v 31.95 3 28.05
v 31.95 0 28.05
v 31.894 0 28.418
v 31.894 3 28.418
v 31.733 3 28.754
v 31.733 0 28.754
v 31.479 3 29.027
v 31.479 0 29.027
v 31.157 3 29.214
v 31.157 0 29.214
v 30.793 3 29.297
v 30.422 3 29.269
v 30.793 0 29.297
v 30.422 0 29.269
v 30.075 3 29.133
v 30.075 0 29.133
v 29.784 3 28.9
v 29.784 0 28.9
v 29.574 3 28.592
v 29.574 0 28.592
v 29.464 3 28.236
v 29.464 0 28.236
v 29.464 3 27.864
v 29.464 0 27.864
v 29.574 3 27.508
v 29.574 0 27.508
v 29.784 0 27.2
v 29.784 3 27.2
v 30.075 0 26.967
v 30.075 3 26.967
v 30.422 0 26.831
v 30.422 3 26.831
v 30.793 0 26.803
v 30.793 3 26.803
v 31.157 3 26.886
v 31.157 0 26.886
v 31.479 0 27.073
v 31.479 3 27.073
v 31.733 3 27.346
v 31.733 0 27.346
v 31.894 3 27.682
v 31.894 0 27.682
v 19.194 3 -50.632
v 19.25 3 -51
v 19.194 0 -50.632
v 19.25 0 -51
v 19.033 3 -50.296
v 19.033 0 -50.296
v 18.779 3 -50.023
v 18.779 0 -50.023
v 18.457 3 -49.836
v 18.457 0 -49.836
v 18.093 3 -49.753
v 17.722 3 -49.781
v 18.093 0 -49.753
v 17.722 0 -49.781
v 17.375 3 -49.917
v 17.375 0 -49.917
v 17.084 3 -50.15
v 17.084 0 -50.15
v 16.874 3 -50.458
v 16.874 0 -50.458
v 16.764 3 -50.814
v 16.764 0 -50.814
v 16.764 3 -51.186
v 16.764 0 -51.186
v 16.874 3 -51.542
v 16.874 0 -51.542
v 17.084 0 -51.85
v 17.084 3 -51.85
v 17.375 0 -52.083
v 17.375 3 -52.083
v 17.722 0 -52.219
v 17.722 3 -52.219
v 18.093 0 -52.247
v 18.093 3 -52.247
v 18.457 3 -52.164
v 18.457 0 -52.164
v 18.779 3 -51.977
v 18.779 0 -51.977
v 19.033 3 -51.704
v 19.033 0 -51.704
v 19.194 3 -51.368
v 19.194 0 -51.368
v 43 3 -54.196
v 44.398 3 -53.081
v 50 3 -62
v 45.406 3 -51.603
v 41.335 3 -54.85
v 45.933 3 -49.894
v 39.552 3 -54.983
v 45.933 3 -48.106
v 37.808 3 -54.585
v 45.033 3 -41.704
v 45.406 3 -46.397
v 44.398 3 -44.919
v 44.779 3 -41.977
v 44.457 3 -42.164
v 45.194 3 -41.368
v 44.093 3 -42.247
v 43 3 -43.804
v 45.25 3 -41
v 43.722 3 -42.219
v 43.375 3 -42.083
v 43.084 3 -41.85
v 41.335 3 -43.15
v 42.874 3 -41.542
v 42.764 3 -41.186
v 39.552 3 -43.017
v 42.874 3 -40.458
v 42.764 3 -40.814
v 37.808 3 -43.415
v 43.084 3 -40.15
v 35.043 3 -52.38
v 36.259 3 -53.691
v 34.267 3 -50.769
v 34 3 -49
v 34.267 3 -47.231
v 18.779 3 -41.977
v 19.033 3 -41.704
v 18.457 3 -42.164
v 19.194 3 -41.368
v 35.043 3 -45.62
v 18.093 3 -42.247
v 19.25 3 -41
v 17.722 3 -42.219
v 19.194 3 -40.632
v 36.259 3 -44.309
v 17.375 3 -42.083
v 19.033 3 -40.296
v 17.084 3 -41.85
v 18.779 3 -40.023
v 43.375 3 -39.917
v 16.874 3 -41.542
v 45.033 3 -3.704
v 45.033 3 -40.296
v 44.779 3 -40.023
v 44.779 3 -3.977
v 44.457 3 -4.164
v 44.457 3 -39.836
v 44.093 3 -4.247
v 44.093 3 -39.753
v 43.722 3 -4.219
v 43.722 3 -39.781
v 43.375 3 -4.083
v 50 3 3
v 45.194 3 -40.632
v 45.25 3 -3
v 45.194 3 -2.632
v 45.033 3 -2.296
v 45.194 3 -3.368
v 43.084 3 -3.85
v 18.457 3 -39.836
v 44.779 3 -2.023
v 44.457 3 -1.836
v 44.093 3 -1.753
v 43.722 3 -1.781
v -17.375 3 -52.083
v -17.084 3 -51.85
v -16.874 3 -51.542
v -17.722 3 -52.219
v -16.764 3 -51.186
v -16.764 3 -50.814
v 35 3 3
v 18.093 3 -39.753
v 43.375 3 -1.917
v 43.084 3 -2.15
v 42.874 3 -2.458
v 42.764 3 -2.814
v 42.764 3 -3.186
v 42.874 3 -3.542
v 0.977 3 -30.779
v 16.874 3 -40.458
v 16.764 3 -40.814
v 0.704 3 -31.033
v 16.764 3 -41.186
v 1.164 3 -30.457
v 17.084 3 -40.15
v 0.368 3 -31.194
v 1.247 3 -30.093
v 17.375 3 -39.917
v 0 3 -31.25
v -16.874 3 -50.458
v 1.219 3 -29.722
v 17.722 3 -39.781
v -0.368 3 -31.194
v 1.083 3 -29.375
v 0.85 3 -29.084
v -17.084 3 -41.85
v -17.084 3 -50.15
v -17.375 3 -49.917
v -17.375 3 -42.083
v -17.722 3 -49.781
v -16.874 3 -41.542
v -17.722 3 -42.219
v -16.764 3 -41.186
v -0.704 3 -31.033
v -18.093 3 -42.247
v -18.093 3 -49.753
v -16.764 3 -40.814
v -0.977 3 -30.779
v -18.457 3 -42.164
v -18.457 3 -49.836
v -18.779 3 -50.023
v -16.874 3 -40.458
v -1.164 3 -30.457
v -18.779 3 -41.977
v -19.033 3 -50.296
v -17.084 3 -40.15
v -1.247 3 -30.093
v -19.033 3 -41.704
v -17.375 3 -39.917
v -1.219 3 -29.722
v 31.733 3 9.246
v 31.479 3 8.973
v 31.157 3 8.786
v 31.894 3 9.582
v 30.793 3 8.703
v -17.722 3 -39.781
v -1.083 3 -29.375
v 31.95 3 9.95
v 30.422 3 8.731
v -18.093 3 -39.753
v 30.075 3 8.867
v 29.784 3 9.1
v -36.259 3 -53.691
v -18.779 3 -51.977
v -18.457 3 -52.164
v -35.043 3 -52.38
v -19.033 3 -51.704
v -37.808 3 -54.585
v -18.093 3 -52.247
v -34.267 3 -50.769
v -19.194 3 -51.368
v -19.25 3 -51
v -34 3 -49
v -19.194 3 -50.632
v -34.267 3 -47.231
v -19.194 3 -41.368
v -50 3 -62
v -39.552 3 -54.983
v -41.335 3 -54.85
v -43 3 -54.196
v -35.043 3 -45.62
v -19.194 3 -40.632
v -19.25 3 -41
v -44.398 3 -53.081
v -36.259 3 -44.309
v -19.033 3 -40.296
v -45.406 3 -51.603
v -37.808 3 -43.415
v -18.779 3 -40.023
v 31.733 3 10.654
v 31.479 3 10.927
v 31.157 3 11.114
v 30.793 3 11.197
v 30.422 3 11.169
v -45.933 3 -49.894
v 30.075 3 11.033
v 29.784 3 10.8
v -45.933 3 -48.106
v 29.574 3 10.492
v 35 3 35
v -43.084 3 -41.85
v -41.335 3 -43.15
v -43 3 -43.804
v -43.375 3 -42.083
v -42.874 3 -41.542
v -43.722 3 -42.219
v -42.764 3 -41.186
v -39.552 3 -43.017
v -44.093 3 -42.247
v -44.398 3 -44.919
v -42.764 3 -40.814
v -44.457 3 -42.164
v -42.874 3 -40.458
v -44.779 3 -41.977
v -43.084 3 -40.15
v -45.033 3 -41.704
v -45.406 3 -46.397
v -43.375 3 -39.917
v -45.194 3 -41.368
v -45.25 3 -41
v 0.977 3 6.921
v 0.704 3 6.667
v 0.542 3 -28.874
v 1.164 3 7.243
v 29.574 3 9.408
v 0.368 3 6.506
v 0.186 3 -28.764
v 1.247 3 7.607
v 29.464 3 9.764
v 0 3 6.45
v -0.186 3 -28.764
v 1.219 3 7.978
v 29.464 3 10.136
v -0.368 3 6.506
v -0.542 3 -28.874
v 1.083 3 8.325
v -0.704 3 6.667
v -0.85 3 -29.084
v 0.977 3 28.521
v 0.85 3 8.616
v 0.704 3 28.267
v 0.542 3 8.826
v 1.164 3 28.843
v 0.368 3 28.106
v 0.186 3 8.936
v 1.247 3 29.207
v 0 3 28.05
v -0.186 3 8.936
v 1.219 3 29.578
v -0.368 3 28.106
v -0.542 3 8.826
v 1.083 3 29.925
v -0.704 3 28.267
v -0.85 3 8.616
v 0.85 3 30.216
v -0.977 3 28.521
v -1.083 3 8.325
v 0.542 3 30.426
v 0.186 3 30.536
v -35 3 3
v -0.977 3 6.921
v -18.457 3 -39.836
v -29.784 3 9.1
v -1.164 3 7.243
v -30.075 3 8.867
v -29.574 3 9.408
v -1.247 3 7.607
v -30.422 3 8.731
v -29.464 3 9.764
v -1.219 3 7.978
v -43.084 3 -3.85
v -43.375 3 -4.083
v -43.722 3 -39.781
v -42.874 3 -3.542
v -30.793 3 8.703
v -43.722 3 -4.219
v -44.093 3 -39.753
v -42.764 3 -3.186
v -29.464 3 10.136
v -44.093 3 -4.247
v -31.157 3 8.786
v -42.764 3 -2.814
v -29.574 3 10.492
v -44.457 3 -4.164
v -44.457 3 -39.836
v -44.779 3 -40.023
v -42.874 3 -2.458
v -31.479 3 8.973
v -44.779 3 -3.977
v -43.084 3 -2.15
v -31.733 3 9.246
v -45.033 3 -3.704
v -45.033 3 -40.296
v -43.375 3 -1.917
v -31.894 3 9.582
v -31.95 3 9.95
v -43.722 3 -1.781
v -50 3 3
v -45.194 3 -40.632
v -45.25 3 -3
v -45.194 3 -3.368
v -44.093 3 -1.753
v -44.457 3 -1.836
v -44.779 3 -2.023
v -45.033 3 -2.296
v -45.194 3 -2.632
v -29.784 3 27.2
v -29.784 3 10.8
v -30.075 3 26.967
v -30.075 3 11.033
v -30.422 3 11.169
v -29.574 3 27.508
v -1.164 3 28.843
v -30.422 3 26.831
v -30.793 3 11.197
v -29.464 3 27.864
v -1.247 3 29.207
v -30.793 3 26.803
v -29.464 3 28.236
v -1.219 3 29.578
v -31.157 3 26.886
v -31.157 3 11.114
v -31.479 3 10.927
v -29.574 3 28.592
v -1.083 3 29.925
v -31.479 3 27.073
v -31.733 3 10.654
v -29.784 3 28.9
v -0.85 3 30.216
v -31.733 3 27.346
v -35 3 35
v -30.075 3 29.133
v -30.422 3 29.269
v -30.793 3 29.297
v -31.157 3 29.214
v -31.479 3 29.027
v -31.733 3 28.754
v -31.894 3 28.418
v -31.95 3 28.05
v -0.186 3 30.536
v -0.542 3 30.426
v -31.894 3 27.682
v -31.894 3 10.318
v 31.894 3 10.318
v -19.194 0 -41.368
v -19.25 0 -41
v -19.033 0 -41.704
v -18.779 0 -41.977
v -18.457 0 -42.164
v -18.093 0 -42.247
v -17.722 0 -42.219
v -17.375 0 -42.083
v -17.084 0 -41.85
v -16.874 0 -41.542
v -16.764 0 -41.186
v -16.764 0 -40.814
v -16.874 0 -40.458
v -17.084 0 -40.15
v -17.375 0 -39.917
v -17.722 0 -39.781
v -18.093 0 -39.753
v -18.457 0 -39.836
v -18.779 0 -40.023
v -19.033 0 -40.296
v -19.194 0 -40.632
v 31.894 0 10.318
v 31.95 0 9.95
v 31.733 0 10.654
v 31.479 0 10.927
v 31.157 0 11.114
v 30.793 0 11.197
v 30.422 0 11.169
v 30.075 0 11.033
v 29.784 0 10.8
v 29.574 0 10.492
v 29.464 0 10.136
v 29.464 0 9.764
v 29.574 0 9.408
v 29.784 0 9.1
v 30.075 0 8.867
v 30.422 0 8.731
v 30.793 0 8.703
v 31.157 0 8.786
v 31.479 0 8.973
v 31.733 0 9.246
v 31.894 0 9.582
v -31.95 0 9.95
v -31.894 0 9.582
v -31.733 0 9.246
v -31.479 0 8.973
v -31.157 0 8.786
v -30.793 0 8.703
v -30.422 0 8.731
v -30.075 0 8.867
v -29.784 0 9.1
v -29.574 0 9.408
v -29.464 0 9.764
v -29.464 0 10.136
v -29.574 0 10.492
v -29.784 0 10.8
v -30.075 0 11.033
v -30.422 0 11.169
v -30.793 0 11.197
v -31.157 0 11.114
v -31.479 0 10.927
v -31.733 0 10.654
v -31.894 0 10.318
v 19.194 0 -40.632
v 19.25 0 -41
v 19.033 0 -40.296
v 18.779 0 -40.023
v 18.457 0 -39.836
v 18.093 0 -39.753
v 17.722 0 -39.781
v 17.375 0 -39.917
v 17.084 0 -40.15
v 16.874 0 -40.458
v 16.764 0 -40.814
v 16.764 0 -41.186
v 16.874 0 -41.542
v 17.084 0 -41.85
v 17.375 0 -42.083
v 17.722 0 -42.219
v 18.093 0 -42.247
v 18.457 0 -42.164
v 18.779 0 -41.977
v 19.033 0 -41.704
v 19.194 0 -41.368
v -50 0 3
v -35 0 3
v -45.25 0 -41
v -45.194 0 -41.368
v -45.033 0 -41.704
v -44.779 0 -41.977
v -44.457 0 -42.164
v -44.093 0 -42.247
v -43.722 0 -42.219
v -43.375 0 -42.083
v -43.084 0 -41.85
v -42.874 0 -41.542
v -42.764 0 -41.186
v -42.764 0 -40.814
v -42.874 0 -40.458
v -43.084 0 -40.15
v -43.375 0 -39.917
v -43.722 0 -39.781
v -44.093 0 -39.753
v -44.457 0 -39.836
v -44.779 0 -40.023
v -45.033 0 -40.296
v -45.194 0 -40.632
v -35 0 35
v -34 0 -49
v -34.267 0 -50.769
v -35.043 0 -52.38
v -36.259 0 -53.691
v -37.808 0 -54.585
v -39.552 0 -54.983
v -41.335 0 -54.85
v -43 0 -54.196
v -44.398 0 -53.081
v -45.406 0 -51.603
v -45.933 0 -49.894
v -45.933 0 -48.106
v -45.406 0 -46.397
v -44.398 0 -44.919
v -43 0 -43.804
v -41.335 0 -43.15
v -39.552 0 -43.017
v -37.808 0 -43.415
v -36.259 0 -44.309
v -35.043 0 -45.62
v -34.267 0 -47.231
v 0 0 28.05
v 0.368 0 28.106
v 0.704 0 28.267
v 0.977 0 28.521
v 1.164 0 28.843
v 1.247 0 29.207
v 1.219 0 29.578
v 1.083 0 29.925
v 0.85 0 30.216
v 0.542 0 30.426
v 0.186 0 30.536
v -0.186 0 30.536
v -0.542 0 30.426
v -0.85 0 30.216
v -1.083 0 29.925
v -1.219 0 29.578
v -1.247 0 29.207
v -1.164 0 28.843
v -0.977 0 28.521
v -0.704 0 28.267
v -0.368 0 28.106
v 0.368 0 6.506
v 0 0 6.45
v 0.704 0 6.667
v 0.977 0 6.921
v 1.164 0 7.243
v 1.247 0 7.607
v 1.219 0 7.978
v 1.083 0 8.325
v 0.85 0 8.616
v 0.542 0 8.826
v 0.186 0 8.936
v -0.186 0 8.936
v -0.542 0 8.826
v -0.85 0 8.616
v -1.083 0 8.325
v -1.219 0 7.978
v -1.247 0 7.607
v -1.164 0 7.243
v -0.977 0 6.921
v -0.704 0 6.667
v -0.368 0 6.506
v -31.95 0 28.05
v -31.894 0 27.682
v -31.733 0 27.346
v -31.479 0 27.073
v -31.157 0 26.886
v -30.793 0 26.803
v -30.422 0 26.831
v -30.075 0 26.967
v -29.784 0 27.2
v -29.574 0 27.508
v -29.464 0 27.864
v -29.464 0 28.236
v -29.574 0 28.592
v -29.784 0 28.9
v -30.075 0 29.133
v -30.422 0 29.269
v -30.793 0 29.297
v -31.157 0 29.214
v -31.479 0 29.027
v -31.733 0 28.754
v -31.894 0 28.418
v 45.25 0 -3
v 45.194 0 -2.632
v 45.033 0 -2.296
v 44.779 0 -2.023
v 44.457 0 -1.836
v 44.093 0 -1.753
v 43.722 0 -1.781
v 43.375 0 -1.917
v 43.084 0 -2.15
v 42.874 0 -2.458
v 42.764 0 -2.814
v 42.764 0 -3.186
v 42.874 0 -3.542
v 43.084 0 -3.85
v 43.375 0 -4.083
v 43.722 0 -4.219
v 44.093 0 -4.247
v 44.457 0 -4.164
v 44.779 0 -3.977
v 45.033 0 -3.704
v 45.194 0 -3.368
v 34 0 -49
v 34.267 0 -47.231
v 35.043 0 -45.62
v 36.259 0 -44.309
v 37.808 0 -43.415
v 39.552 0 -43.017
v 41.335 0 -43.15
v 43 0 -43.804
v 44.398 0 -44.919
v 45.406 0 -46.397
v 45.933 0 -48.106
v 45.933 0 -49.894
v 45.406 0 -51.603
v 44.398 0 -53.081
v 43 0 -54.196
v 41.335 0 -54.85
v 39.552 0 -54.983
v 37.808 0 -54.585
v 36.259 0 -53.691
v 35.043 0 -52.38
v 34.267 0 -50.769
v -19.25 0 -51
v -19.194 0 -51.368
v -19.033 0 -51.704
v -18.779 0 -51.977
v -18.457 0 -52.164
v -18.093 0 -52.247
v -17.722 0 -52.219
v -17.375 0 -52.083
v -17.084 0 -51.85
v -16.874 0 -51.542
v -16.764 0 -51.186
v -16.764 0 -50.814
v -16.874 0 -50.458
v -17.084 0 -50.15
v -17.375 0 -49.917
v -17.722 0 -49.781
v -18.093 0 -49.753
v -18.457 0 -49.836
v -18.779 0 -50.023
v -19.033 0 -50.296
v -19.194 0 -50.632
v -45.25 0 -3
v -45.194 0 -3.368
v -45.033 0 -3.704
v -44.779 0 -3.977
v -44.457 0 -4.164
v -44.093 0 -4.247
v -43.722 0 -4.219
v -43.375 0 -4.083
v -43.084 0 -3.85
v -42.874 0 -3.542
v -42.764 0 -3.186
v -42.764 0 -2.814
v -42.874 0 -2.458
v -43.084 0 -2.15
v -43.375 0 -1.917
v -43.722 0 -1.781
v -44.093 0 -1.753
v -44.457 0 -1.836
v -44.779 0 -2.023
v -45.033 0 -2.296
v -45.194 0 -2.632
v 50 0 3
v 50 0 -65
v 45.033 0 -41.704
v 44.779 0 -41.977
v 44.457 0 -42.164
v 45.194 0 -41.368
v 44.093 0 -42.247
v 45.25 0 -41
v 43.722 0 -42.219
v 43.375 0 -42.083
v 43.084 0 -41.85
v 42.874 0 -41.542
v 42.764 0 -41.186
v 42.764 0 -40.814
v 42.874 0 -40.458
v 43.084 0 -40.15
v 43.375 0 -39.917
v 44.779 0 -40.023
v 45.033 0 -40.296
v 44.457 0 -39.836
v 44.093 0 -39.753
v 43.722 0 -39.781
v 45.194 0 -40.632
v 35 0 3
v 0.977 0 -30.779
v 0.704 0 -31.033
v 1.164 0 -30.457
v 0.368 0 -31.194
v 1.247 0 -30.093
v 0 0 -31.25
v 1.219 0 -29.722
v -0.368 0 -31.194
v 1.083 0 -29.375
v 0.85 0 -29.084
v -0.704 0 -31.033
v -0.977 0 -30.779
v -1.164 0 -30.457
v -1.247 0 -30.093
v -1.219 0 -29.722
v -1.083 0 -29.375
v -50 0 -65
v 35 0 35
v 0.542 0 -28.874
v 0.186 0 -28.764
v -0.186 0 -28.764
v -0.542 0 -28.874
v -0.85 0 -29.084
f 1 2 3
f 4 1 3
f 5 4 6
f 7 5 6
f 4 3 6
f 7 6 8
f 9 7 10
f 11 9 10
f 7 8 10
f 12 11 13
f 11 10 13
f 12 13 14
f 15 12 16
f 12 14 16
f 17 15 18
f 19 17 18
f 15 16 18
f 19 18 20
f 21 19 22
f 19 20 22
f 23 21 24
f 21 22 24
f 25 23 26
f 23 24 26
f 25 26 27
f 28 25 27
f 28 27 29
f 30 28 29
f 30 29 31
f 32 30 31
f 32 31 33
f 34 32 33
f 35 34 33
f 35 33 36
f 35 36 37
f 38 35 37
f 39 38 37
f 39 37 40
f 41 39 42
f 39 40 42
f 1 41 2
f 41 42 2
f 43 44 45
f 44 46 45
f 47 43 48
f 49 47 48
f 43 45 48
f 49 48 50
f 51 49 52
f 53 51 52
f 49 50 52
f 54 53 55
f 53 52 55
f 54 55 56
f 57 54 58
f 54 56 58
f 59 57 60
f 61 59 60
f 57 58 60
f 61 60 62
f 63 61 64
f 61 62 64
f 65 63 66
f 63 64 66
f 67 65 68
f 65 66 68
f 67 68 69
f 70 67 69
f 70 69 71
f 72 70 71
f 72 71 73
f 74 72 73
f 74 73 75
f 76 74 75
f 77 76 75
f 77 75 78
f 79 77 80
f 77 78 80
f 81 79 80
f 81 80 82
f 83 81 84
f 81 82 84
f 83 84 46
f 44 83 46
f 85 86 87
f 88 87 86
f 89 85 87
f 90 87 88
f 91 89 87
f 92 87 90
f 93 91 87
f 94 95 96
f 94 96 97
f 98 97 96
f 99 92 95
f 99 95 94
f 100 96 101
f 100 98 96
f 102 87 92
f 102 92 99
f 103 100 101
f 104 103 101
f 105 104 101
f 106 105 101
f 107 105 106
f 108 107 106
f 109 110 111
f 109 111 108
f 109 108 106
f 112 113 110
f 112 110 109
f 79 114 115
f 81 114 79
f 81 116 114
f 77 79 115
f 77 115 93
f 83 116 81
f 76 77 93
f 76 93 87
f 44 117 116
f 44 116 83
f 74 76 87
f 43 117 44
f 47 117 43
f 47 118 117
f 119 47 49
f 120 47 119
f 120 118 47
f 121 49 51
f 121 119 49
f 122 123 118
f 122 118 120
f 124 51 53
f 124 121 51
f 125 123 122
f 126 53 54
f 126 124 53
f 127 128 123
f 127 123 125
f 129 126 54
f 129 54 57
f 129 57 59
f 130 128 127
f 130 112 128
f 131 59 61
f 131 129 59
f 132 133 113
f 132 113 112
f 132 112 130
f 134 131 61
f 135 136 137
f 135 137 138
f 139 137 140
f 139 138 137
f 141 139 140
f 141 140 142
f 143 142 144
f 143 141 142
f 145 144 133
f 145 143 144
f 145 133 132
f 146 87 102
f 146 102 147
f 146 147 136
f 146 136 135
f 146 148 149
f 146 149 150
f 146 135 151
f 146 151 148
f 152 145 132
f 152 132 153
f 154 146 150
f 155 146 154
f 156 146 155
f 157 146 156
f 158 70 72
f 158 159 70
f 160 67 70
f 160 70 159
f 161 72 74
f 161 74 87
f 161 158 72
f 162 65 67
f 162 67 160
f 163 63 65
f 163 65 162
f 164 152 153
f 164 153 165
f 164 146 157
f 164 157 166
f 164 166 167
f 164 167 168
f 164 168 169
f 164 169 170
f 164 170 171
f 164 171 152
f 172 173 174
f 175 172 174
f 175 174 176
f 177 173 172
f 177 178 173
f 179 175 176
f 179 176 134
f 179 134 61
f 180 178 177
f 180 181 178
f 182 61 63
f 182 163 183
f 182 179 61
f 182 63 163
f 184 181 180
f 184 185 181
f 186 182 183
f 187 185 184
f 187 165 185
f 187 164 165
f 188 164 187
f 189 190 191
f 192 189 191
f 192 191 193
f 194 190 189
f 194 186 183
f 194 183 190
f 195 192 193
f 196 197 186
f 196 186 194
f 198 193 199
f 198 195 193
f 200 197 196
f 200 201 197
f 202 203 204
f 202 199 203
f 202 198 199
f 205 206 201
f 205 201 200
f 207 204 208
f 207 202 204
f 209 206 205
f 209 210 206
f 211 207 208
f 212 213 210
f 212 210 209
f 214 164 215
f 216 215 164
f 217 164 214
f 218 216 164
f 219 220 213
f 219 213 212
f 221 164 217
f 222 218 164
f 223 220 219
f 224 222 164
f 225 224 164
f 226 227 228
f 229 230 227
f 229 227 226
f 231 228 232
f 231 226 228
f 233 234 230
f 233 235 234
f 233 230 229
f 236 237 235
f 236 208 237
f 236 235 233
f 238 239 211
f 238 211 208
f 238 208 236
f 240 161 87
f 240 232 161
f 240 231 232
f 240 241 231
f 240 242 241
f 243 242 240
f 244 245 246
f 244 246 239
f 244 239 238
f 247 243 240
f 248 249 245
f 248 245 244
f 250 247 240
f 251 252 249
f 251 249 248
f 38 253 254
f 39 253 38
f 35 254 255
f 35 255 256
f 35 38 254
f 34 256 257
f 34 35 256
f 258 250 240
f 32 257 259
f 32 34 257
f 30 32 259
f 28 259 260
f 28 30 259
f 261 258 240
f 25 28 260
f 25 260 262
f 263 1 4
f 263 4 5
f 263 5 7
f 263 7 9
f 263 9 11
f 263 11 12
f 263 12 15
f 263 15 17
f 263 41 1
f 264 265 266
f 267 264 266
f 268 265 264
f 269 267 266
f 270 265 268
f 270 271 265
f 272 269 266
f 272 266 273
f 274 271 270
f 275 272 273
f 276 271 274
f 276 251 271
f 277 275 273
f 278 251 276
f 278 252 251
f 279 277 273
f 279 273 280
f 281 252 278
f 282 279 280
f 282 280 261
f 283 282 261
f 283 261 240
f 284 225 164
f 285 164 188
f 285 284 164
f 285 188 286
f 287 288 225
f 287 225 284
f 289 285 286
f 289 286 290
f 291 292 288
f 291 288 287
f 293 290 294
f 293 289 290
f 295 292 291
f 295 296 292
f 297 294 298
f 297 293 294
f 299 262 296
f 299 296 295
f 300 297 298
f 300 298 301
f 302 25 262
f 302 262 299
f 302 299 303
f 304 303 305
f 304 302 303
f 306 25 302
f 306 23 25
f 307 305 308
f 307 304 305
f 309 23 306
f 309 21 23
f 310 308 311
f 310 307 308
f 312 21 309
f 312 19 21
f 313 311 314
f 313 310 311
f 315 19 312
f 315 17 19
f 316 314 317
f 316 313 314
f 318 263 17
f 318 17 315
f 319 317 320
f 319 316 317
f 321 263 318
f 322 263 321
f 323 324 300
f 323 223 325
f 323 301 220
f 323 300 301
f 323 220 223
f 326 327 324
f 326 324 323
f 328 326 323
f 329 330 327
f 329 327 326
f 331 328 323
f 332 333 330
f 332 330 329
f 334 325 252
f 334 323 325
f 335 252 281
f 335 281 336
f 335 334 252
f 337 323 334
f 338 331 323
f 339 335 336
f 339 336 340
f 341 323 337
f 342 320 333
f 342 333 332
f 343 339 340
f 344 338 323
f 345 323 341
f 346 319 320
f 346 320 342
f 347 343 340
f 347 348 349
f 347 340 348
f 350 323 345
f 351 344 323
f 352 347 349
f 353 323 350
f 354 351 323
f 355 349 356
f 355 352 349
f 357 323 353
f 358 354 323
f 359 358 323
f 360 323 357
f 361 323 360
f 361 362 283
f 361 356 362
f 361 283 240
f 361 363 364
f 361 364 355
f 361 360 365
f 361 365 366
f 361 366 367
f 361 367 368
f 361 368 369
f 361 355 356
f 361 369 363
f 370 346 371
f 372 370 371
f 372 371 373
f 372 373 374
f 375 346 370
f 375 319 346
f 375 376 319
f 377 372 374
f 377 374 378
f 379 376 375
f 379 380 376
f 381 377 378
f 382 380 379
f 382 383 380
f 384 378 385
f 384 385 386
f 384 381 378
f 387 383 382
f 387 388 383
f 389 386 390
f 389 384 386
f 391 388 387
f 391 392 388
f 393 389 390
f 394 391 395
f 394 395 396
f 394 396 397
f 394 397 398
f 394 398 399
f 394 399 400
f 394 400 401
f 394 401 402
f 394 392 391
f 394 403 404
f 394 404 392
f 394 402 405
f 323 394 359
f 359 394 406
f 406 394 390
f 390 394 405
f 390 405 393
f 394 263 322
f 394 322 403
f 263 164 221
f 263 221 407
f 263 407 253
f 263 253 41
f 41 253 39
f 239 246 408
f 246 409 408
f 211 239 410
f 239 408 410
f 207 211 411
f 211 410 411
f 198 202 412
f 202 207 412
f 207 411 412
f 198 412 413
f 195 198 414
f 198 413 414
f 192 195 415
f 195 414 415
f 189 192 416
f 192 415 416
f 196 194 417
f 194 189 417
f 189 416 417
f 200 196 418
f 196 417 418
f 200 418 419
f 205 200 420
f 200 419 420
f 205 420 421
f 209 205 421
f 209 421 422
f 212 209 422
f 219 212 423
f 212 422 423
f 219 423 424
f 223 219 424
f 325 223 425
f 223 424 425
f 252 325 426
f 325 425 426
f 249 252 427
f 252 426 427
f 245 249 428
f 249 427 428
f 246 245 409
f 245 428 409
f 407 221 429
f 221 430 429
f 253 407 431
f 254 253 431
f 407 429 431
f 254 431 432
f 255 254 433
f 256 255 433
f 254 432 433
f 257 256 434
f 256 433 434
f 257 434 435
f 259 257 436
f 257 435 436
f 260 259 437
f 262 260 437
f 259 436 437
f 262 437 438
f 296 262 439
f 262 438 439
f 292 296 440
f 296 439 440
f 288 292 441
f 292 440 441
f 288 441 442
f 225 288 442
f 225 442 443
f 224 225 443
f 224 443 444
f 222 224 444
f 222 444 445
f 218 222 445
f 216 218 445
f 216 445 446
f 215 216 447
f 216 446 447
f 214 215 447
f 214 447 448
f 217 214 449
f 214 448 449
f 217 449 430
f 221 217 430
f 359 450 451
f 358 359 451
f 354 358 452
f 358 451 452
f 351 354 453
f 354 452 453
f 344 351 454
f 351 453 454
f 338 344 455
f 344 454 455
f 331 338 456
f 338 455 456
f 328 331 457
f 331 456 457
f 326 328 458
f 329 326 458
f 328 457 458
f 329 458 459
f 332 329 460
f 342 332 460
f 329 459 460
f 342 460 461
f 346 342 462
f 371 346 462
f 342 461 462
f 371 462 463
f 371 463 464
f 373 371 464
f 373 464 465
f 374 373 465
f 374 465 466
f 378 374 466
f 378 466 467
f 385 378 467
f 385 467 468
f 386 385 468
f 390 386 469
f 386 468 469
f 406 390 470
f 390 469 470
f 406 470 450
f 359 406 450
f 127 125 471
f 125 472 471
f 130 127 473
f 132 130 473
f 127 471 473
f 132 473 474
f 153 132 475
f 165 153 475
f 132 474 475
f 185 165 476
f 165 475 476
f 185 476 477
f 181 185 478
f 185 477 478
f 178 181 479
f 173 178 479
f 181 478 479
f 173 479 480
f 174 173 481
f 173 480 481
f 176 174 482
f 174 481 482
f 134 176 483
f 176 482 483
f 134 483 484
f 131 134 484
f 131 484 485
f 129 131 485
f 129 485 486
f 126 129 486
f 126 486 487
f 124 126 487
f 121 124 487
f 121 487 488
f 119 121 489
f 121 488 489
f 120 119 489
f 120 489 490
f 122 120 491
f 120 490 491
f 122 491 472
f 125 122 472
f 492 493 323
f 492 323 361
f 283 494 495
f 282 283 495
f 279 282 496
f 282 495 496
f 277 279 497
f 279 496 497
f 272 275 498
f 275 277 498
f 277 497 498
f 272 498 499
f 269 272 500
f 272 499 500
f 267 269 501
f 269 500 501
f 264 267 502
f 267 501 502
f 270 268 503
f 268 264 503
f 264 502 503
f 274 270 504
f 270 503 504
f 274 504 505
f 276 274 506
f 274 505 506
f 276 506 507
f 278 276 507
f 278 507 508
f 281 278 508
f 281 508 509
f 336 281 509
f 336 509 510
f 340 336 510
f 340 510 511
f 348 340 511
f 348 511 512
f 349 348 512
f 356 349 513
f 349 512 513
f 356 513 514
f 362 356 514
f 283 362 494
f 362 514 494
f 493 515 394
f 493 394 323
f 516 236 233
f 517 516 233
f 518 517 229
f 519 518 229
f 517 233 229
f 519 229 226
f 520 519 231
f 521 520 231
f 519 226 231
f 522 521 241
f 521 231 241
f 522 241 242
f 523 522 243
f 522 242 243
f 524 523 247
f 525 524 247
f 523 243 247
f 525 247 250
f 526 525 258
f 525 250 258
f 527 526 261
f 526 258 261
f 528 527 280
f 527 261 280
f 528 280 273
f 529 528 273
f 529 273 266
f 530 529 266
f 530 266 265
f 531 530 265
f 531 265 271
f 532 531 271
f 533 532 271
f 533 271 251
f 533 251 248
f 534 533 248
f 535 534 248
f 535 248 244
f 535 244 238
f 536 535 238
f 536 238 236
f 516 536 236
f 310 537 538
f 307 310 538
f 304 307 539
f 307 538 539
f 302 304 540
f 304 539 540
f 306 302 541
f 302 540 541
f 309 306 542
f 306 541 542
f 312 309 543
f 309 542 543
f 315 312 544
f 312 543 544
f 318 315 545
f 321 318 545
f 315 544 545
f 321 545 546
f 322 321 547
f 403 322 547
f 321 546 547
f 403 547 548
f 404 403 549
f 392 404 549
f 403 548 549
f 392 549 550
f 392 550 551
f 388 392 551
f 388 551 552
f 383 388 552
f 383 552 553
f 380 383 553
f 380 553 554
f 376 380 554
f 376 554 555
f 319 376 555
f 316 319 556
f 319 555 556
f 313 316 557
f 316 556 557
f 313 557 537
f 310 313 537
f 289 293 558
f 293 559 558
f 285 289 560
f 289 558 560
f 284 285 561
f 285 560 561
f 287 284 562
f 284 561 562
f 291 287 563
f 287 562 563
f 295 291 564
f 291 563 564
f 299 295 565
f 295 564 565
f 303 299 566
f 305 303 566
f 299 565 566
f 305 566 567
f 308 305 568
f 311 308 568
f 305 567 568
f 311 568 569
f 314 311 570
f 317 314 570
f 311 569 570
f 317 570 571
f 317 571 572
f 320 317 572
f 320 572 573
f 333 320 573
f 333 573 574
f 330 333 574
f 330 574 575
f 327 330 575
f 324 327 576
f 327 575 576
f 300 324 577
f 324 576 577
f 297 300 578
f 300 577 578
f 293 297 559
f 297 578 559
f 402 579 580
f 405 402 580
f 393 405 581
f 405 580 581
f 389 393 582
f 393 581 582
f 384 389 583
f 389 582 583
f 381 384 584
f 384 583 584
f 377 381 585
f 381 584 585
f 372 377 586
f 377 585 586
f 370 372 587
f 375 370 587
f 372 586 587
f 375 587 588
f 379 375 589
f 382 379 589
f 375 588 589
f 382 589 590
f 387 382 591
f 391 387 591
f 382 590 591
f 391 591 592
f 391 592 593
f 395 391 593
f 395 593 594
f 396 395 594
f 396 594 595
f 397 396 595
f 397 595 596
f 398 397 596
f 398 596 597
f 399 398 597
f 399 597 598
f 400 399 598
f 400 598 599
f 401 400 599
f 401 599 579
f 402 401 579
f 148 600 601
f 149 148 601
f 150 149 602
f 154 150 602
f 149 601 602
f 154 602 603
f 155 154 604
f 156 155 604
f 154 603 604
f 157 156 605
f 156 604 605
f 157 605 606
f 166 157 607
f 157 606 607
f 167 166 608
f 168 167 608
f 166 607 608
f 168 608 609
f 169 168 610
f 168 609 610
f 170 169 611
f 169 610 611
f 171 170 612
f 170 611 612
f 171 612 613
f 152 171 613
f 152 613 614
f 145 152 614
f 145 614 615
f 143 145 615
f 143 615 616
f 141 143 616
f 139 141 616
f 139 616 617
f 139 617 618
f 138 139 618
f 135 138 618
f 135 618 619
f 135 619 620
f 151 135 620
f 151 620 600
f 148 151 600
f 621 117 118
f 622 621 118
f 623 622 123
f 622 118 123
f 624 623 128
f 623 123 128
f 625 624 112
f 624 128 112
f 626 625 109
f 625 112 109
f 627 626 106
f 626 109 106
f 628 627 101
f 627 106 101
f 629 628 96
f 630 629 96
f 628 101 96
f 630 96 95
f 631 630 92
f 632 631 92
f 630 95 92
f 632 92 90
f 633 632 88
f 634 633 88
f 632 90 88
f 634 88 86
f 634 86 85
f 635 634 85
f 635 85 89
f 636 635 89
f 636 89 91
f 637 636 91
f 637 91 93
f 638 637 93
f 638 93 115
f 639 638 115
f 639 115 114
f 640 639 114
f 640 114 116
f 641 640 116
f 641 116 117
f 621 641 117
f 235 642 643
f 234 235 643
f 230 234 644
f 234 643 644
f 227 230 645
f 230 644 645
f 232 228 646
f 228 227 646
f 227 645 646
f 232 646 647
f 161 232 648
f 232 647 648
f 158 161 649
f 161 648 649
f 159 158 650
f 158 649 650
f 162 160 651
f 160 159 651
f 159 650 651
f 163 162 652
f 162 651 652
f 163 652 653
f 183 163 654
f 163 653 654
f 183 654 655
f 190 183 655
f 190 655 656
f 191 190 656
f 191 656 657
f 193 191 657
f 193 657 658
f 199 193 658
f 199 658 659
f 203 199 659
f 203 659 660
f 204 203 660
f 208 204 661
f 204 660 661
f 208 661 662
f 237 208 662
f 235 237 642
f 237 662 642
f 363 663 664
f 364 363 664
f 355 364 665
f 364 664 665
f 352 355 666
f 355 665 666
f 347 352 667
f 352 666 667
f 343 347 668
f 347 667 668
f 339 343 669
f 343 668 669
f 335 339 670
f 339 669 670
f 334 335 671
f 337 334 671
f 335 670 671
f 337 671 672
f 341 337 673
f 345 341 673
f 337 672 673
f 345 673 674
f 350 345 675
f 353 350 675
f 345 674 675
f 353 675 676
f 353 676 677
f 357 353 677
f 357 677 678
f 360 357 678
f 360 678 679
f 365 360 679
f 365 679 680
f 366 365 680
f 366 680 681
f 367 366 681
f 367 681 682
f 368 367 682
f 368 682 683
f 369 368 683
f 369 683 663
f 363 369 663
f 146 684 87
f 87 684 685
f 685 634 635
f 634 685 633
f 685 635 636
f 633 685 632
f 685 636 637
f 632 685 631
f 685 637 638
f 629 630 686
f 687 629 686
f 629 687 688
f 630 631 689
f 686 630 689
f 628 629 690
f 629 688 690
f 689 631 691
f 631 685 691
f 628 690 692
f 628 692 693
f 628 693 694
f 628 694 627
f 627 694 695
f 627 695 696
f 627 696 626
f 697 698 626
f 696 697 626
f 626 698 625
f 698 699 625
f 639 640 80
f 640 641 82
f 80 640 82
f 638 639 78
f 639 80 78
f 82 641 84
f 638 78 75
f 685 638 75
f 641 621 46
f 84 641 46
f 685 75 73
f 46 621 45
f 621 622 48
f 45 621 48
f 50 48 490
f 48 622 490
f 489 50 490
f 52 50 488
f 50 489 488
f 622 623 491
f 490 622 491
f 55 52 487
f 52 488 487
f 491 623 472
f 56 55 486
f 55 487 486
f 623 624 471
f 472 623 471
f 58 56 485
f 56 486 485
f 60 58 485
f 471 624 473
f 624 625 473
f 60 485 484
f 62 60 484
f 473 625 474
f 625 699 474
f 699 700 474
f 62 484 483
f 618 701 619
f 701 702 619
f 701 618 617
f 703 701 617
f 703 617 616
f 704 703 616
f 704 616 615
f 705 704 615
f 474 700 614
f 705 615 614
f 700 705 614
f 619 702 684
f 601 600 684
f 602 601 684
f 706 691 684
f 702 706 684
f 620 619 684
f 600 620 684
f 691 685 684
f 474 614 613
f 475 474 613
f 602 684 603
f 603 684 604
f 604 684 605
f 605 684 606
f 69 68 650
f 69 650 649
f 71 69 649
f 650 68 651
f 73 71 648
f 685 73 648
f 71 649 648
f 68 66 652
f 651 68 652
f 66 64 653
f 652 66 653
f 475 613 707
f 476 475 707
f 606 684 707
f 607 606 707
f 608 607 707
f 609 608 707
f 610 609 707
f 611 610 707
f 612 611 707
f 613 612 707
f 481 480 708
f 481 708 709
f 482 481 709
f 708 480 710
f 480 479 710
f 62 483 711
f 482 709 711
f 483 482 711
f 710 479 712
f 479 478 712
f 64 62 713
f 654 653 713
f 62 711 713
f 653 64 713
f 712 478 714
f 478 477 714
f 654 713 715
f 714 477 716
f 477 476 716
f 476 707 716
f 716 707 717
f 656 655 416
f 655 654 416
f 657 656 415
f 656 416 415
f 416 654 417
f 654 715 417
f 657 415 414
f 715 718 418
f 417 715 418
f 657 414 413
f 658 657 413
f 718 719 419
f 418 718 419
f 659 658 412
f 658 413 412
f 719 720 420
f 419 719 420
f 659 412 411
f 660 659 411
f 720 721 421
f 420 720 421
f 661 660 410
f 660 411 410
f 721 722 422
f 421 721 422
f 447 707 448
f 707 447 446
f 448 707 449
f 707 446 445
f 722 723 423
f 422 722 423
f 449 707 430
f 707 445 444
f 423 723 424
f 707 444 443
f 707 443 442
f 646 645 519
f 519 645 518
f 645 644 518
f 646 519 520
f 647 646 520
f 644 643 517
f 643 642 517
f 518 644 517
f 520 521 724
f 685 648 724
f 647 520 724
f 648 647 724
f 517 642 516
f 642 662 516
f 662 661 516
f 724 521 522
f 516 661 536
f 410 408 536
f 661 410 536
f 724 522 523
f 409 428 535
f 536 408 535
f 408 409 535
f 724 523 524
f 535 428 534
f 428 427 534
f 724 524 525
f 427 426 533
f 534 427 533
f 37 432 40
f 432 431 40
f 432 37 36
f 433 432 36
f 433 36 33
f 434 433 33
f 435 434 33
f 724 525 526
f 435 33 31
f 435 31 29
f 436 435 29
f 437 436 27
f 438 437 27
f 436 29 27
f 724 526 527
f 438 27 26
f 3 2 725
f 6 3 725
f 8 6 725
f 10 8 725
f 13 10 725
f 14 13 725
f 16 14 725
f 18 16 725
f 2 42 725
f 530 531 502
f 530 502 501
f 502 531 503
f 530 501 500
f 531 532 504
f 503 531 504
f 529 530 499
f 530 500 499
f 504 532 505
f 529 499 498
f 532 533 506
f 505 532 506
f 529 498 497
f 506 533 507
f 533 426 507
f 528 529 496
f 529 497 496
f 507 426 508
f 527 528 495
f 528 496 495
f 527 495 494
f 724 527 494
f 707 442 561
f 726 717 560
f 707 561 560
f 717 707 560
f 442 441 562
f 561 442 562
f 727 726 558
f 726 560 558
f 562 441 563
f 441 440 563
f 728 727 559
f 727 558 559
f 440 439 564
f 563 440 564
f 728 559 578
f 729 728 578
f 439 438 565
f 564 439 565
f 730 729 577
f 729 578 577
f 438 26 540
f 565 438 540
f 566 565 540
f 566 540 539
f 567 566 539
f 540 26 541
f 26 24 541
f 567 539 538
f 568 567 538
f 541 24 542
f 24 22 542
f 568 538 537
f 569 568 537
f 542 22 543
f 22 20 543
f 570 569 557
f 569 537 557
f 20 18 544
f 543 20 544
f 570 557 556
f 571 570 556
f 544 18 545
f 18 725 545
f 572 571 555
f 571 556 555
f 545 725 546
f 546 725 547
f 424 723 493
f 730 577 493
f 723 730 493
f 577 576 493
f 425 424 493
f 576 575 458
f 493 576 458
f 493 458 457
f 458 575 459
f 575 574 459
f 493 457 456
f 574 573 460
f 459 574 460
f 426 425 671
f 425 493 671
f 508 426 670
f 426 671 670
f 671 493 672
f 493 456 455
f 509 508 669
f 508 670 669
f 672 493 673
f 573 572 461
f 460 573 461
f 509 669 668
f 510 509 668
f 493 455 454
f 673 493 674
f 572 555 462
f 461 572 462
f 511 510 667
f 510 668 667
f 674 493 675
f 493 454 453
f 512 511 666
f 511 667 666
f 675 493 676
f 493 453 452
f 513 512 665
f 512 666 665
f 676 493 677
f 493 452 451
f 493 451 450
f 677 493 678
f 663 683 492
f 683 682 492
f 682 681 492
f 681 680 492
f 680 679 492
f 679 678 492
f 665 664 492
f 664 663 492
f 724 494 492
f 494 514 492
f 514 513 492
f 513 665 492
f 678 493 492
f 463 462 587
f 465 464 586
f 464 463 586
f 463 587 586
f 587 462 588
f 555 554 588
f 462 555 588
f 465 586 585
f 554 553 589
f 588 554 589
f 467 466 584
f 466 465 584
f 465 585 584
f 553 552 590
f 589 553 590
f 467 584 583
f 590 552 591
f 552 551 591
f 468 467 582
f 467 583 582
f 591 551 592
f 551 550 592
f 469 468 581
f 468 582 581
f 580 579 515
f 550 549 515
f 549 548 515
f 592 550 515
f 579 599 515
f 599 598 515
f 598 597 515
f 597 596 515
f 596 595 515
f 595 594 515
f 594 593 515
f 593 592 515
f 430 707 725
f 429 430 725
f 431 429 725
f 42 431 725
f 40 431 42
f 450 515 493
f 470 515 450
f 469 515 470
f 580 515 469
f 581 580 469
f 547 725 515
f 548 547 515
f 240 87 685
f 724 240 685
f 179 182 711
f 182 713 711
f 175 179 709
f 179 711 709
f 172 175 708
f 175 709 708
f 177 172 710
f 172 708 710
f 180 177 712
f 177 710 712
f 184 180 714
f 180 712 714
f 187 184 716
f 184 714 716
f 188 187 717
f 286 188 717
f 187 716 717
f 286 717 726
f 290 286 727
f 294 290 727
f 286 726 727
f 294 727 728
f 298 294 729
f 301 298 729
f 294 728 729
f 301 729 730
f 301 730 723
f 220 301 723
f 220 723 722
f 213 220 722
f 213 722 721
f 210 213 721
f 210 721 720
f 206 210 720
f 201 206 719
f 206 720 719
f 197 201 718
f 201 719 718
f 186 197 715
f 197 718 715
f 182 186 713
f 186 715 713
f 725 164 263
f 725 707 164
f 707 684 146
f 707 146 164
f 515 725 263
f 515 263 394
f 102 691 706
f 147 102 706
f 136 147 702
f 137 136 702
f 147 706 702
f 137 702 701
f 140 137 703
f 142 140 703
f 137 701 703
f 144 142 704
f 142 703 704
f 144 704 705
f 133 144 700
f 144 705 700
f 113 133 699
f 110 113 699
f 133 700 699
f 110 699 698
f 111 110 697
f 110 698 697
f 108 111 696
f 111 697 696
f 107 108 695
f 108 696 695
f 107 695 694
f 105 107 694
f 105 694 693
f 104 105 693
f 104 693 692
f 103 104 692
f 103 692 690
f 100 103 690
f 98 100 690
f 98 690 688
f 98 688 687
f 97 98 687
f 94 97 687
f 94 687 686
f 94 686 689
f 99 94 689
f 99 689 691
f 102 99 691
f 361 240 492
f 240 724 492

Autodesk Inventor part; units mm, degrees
ref_plane "YZ Plane" through (0, 0, 0) normal (1, 0, 0) x (0, 1, 0)
ref_plane "XZ Plane" through (0, 0, 0) normal (0, 1, 0) x (-1, 0, 0)
ref_plane "XY Plane" through (0, 0, 0) normal (0, 0, 1) x (1, 0, 0)
sketch "Sketch1" plane through (0, 0, 0) normal (0, 1, 0) x (-1, 0, 0)
  line L0 (35, 35) -> (35, 3)
  line L1 (9, 3) -> (35, 3) construction
  line L2 (0, 3) -> (9, 3) construction
  line L3 (35, 3) -> (50, 3)
  line L4 (0, -35) -> (0, 35)
  line L5 (0, -35) -> (50, -35)
  line L6 (0, 35) -> (35, 35)
  line L7 (50, -35) -> (50, 3)
  line L8 (30.7, 28.05) -> (35, 28.05) construction
  line L9 (30.7, 28.05) -> (30.7, 9.95) construction
  line L10 (30.7, 9.95) -> (30.7, 3) construction
  circle A0 centre (30.7, 9.95) radius 1.25
  circle A1 centre (30.7, 28.05) radius 1.25
  circle A2 centre (44, -3) radius 1.25
  arc A3 (0, -31.25) -> (0, -28.75) centre (0, -30) ccw
  arc A4 (0, 6.45) -> (0, 8.95) centre (0, 7.7) ccw
  arc A5 (0, 28.05) -> (0, 30.55) centre (0, 29.3) ccw
  line L11 (0, 29.3) -> (30.7, 29.3) construction
  line L12 (50, -35) -> (50, -65)
  line L13 (50, -65) -> (0, -65)
  line L14 (0, -35) -> (0, -65)
  circle A6 centre (44, -41) radius 1.25
  circle A7 centre (18, -41) radius 1.25
  circle A8 centre (18, -51) radius 1.25
  point P0 (0, 0)
  point P1 (-50, 0)
  point P2 (0, 0)
  dimension "d26" = 2.5
  dimension "d6" = 32
  dimension "d9" = 26
  dimension "d10" = 9
  dimension "d11" = 50
  dimension "d12" = 70
  dimension "d14" = 4.3
  dimension "d15" = 18.1
  dimension "d20" = 6.95
  dimension "d25" = 2.5
  dimension "d32" = 2.5
  dimension "d33" = 2.5
  dimension "d35" = 2.5
  dimension "d36" = 30
  dimension "d37" = 6
  dimension "d38" = 6
  dimension "d39" = 32
  dimension "d40" = 10
  dimension "d41" = 2.5
  dimension "d42" = 2.5
  dimension "d43" = 2.5
  dimension "d55" = 6
  dimension "d56" = 6
  dimension "d57" = 2.5
  dimension "d58" = 5
  dimension "d59" = 2.25
extrude "Extrusion1" add sketch "Sketch1" along normal blind 3 contours L0 L3 L7 L5 L4 A3 A4 A5 L6 | A5 L4 | L12 L13 L14 L5 | A4 L4 | L4 A3 | A0 | A1 | A2
extrude "Extrusion4" cut sketch "Sketch1" along normal through all contours A5 L4 | A4 L4 | L4 A3 | A0 | A1 | A2
mirror "Mirror1" about plane through (0, 0, 0) normal (1, 0, 0) of "Extrusion1", "Extrusion4"
sketch "Sketch4" plane through (-50, 0, -65) normal (-1, 0, 0) x (0, 0, 1)
  line L0 (0, 3) -> (68, 3) projected
  line L1 (0, 3) -> (3, 3)
  line L2 (0, 0) -> (68, 0) projected
  line L3 (3, 3) -> (0, 0)
  line L4 (0, 0) -> (0, 3) projected
  line L5 (0, 0) -> (0, 3)
  point P0 (65, 0)
  dimension "d44" = 3
extrude "Extrusion5" cut sketch "Sketch4" against normal through all
sketch "Sketch5" plane through (0, 3, 0) normal (0, 1, 0) x (1, 0, 0)
  circle A0 centre (-40, 49) radius 6
  line L0 (-50, 62) -> (-50, -3) projected
  line L1 (50, 62) -> (-50, 62) projected
  point P0 (0, 0)
  dimension "d50" = 10
  dimension "d51" = 13
  dimension "d52" = 12
extrude "Extrusion6" cut sketch "Sketch5" against normal through all
mirror "Mirror2" about plane through (0, 0, 0) normal (1, 0, 0) of "Extrusion6"
properties part number "Podstawa_All_in_One_3mm"
